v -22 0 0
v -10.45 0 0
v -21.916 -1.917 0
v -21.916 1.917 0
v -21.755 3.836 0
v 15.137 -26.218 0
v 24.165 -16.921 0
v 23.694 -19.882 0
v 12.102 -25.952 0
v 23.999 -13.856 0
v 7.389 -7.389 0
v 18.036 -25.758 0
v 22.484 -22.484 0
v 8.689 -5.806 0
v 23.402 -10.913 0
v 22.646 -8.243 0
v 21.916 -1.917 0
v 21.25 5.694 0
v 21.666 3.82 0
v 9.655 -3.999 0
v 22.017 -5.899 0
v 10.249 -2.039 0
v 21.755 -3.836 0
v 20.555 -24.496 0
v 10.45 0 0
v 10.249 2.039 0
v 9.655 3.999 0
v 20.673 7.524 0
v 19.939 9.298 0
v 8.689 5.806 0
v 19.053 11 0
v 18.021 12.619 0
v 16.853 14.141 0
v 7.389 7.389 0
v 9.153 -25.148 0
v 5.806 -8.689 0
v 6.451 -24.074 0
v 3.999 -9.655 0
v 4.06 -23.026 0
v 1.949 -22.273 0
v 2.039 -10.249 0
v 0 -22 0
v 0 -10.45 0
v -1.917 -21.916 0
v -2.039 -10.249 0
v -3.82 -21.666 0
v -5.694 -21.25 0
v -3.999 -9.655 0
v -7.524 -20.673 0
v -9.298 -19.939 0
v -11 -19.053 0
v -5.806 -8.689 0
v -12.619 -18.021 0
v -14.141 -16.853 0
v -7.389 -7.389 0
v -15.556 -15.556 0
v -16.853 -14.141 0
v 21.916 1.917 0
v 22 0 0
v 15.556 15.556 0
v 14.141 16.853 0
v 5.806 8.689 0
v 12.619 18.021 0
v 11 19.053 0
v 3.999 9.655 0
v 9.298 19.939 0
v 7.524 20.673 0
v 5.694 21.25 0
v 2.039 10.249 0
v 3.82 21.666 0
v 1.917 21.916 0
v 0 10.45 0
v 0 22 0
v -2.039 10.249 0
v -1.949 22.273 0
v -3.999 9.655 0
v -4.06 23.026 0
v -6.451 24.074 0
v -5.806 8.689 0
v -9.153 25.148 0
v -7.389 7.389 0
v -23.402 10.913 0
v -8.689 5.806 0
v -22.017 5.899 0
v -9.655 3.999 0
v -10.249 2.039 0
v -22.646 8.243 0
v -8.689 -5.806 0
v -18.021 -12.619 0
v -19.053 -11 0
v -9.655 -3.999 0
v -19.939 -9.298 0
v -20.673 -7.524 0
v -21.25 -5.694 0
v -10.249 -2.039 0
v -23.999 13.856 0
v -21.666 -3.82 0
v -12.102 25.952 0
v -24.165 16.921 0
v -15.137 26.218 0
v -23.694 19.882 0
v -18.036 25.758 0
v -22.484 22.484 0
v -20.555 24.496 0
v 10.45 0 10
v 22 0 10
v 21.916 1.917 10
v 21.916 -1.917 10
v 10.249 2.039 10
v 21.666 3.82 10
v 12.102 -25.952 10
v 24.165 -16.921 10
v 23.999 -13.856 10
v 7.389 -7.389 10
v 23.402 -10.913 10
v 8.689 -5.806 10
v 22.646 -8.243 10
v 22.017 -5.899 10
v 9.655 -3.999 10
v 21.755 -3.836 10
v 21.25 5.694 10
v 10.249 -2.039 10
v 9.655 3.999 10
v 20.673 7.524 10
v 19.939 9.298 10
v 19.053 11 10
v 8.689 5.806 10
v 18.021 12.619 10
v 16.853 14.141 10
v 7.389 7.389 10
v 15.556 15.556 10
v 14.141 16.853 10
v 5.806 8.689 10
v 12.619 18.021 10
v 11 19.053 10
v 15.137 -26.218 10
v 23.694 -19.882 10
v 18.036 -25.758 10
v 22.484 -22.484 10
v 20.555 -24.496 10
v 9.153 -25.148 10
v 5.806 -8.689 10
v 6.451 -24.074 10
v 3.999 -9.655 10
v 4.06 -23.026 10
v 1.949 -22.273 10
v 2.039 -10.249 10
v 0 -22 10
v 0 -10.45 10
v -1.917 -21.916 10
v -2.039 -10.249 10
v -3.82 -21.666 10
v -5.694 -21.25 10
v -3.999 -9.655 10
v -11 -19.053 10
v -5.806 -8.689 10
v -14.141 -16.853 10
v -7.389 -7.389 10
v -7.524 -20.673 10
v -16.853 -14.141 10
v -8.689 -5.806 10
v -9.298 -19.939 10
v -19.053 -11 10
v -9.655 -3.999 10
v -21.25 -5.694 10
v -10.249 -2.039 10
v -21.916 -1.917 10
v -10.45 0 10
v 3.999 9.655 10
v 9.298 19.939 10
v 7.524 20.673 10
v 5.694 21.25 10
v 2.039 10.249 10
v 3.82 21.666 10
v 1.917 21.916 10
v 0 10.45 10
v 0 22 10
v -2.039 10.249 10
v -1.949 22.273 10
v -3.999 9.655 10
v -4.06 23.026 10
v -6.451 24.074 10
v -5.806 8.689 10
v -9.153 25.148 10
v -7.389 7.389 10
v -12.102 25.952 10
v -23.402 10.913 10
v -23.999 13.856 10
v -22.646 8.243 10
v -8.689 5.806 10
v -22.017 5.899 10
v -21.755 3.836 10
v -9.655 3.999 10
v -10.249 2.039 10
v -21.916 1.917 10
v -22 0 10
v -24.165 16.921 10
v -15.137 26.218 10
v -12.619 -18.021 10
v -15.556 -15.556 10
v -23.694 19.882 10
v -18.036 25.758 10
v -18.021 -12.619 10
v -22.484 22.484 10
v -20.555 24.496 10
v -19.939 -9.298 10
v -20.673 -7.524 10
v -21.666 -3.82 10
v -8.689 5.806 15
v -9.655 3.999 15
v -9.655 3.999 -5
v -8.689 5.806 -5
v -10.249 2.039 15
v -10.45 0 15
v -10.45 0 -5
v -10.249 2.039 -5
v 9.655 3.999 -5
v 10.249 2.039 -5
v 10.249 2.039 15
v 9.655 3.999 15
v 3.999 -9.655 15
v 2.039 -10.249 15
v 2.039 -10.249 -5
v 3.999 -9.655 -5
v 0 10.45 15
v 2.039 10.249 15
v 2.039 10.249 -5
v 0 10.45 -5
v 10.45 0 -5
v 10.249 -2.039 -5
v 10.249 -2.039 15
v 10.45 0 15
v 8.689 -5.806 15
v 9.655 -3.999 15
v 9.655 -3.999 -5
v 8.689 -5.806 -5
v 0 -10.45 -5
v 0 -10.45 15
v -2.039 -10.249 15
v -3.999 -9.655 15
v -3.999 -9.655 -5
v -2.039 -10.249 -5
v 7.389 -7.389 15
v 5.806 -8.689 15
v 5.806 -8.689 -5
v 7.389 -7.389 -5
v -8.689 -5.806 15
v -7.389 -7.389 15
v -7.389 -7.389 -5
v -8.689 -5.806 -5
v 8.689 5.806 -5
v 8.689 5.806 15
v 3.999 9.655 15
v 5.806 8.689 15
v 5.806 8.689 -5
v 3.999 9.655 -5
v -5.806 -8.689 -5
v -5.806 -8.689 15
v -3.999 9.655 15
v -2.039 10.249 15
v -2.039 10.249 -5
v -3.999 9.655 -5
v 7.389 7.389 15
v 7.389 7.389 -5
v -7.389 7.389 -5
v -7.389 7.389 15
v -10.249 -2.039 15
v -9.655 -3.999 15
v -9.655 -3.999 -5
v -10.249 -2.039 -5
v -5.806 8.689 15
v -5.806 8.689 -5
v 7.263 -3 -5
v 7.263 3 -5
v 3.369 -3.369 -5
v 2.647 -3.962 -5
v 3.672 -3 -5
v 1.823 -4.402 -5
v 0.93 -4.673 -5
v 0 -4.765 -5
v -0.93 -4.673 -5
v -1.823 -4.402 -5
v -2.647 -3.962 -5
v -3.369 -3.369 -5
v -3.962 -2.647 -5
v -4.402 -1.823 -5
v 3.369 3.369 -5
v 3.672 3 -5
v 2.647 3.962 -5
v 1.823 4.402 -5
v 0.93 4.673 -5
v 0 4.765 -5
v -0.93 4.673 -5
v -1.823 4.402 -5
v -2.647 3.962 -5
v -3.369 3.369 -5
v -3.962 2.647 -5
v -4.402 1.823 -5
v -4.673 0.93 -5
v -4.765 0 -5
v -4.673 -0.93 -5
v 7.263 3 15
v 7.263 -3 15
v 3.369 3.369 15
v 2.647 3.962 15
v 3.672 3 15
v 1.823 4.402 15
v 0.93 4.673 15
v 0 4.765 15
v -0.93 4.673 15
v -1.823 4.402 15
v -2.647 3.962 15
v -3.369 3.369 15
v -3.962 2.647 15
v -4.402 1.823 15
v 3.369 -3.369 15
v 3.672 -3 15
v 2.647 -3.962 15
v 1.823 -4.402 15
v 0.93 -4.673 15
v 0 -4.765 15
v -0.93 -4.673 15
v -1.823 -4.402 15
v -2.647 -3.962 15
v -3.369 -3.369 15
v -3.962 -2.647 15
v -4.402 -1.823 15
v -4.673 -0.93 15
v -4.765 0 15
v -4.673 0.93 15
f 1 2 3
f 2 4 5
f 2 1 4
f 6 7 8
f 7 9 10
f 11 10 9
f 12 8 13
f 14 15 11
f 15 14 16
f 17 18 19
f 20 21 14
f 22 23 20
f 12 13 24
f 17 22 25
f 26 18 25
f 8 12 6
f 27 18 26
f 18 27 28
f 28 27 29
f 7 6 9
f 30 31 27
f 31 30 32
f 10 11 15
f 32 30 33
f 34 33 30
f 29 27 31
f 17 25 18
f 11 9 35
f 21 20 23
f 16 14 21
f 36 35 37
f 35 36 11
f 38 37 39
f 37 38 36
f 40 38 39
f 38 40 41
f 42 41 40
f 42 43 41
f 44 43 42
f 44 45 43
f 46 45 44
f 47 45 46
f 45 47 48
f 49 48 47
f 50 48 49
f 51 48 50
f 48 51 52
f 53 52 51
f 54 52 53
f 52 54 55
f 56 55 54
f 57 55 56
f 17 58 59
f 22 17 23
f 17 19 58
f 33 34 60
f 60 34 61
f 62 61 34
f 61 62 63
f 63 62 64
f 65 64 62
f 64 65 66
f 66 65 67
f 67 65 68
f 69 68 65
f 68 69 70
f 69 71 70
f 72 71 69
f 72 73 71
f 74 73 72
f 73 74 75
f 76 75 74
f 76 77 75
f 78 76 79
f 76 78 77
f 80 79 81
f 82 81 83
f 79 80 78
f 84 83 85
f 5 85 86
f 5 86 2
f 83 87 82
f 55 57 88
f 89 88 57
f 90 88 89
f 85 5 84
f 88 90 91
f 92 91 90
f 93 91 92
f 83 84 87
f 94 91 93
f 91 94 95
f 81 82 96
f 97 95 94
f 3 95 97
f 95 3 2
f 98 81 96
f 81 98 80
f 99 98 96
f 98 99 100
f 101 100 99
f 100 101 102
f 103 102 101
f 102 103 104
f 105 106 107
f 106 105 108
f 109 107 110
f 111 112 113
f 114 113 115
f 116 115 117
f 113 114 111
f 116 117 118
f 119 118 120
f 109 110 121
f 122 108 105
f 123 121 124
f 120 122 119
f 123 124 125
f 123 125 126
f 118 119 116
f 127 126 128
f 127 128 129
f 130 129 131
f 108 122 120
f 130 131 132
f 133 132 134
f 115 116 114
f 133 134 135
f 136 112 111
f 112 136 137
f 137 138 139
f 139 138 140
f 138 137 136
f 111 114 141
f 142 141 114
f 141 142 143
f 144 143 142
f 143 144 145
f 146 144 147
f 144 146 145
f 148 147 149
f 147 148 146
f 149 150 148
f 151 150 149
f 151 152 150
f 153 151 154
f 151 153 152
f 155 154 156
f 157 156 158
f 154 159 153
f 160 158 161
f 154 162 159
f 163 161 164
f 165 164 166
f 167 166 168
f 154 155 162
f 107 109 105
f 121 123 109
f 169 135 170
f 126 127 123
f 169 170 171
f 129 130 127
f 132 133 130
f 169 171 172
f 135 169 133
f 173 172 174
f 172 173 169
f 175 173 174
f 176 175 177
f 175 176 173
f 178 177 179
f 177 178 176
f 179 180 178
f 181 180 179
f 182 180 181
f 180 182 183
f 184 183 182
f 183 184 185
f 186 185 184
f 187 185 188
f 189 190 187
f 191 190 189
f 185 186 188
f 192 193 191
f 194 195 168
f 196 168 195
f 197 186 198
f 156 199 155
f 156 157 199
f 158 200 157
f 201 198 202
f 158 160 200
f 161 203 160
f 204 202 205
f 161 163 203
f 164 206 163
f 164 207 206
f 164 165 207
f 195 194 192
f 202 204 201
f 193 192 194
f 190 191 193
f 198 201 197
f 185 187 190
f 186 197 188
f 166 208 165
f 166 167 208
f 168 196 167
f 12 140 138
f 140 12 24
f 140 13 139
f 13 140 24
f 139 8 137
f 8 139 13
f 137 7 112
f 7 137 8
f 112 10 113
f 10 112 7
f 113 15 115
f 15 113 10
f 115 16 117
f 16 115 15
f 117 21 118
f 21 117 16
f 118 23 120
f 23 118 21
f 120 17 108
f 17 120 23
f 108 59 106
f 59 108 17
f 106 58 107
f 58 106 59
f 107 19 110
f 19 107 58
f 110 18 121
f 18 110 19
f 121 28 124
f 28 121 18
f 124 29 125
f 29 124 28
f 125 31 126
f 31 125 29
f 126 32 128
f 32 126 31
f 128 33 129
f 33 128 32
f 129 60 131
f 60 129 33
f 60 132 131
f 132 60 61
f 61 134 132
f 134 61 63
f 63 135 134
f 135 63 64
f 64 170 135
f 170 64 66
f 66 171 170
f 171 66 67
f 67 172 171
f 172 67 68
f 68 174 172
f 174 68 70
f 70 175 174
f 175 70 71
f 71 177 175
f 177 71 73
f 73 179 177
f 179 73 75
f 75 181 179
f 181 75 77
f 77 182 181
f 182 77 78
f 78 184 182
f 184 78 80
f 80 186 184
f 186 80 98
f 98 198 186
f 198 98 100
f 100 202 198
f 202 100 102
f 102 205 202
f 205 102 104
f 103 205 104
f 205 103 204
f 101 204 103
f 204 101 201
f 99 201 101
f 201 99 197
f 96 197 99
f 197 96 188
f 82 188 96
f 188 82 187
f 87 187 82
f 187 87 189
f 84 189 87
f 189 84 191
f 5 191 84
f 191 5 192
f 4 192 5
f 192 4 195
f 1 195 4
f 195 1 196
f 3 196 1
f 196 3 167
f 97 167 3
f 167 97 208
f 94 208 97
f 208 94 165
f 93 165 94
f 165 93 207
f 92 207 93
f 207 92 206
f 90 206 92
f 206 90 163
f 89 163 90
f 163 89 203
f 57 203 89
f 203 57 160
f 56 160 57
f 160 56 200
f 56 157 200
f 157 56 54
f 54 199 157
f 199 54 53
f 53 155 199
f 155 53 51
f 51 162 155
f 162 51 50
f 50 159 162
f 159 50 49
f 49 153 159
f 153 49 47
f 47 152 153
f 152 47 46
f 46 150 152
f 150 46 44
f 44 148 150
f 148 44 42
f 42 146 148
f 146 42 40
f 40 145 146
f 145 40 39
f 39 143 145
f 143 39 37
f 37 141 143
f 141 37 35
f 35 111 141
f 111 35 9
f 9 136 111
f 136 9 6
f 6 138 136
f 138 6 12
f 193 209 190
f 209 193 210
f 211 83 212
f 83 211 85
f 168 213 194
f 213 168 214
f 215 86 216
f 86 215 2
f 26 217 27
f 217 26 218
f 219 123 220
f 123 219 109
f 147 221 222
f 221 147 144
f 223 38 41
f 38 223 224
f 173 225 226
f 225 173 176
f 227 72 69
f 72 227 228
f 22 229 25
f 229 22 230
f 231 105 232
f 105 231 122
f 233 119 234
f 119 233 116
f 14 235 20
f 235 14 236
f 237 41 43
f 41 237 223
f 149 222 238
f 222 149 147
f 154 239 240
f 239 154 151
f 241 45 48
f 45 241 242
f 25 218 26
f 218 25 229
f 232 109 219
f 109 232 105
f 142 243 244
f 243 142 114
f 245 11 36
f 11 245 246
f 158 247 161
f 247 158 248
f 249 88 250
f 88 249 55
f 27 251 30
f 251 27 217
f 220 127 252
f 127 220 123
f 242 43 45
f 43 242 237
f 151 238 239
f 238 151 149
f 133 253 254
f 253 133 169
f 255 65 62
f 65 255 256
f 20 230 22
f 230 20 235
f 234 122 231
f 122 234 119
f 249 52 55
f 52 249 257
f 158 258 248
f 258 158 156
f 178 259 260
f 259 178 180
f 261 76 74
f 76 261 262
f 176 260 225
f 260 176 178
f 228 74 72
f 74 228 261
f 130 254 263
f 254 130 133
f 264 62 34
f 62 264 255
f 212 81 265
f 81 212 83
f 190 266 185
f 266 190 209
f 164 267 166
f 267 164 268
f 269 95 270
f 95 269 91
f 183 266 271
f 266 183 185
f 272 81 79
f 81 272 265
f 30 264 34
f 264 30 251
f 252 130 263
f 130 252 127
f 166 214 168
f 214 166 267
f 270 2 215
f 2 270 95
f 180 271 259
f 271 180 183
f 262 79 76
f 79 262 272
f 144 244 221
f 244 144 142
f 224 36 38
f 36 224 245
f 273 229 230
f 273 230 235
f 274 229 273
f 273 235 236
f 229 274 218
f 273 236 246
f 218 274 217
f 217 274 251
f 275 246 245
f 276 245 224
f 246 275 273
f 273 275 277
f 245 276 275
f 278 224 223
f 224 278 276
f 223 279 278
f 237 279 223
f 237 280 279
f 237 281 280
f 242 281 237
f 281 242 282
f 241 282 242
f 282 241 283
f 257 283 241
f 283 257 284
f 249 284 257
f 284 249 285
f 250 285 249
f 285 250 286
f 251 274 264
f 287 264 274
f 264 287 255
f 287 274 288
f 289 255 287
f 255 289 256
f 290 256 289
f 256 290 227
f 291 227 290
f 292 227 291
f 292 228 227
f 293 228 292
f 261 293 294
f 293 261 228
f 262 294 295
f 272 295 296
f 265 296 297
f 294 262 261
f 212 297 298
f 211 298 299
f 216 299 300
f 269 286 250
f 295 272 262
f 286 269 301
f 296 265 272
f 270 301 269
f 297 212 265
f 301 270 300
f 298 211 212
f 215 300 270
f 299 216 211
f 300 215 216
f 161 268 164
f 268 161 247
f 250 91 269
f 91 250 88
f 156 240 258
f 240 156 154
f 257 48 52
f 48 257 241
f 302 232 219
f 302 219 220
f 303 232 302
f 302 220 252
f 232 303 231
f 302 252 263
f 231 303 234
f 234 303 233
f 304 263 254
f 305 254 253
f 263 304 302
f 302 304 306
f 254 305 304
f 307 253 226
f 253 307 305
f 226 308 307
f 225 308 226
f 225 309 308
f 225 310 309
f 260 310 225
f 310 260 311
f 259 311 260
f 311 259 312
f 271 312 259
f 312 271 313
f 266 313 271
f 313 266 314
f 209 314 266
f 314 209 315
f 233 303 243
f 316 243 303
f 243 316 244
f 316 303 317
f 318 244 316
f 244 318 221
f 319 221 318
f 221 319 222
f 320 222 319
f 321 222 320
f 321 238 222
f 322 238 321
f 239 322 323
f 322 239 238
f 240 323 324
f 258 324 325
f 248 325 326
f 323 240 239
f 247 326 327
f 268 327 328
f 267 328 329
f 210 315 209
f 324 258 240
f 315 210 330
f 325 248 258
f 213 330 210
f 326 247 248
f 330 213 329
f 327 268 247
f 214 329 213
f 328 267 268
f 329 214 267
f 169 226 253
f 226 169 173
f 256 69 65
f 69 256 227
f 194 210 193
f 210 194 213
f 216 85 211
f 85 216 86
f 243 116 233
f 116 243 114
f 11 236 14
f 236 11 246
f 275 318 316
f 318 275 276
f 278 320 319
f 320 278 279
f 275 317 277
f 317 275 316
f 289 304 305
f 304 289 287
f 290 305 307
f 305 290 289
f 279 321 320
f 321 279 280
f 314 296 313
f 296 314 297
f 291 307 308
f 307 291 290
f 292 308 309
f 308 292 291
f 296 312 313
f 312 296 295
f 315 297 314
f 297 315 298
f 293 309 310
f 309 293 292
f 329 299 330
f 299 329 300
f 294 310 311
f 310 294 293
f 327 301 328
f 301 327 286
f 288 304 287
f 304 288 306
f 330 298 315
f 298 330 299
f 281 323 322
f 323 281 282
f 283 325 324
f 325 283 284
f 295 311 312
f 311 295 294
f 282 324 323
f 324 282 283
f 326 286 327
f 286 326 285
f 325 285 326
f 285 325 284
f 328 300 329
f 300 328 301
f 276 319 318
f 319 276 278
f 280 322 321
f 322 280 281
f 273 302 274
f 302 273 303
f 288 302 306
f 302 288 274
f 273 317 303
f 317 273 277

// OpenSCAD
$fn = 32;

// ----------------------------------------------------------------------
// Cam: base radius 22 mm with a 10 mm lift over 150 degrees
// ----------------------------------------------------------------------

// --- parameters (mm) ---
base_r = 22;              // base radius
lift = 10;                // lift height above the base radius
lift_span = 150;          // angular width of the lift
lift_start = 90;          // angle where the lift starts
cam_t = 10;               // cam plate thickness
hub_d = 20.9;             // hub diameter
hub_h = 20;               // hub height
bore_d = 9.53;            // bore
key_w = 6;                // keyway width
key_depth = 3;            // keyway depth

cam_profile = [[22, 0], [21.916, 1.917], [21.666, 3.82], [21.25, 5.694], [20.673, 7.524], [19.939, 9.298], [19.053, 11], [18.021, 12.619], [16.853, 14.141], [15.556, 15.556], [14.141, 16.853], [12.619, 18.021], [11, 19.053], [9.298, 19.939], [7.524, 20.673], [5.694, 21.25], [3.82, 21.666], [1.917, 21.916], [0, 22], [-1.949, 22.273], [-4.06, 23.026], [-6.451, 24.074], [-9.153, 25.148], [-12.102, 25.952], [-15.137, 26.218], [-18.036, 25.758], [-20.555, 24.496], [-22.484, 22.484], [-23.694, 19.882], [-24.165, 16.921], [-23.999, 13.856], [-23.402, 10.913], [-22.646, 8.243], [-22.017, 5.899], [-21.755, 3.836], [-21.916, 1.917], [-22, 0], [-21.916, -1.917], [-21.666, -3.82], [-21.25, -5.694], [-20.673, -7.524], [-19.939, -9.298], [-19.053, -11], [-18.021, -12.619], [-16.853, -14.141], [-15.556, -15.556], [-14.141, -16.853], [-12.619, -18.021], [-11, -19.053], [-9.298, -19.939], [-7.524, -20.673], [-5.694, -21.25], [-3.82, -21.666], [-1.917, -21.916], [0, -22], [1.949, -22.273], [4.06, -23.026], [6.451, -24.074], [9.153, -25.148], [12.102, -25.952], [15.137, -26.218], [18.036, -25.758], [20.555, -24.496], [22.484, -22.484], [23.694, -19.882], [24.165, -16.921], [23.999, -13.856], [23.402, -10.913], [22.646, -8.243], [22.017, -5.899], [21.755, -3.836], [21.916, -1.917]];

difference() {
  union() {
    linear_extrude(height = cam_t) polygon(cam_profile);
    /* hub, proud of the cam plate on both sides */
    translate([0, 0, -5]) cylinder(h = hub_h, d = hub_d);
  }
  /* bore through the hub, 2.5 mm clear on both faces */
  translate([0, 0, -7.5]) cylinder(h = hub_h + 5, d = bore_d);
  /* keyway, milled through the whole hub */
  translate([1.763, -3, -7.5]) cube([5.5, 6, 25]);
}
